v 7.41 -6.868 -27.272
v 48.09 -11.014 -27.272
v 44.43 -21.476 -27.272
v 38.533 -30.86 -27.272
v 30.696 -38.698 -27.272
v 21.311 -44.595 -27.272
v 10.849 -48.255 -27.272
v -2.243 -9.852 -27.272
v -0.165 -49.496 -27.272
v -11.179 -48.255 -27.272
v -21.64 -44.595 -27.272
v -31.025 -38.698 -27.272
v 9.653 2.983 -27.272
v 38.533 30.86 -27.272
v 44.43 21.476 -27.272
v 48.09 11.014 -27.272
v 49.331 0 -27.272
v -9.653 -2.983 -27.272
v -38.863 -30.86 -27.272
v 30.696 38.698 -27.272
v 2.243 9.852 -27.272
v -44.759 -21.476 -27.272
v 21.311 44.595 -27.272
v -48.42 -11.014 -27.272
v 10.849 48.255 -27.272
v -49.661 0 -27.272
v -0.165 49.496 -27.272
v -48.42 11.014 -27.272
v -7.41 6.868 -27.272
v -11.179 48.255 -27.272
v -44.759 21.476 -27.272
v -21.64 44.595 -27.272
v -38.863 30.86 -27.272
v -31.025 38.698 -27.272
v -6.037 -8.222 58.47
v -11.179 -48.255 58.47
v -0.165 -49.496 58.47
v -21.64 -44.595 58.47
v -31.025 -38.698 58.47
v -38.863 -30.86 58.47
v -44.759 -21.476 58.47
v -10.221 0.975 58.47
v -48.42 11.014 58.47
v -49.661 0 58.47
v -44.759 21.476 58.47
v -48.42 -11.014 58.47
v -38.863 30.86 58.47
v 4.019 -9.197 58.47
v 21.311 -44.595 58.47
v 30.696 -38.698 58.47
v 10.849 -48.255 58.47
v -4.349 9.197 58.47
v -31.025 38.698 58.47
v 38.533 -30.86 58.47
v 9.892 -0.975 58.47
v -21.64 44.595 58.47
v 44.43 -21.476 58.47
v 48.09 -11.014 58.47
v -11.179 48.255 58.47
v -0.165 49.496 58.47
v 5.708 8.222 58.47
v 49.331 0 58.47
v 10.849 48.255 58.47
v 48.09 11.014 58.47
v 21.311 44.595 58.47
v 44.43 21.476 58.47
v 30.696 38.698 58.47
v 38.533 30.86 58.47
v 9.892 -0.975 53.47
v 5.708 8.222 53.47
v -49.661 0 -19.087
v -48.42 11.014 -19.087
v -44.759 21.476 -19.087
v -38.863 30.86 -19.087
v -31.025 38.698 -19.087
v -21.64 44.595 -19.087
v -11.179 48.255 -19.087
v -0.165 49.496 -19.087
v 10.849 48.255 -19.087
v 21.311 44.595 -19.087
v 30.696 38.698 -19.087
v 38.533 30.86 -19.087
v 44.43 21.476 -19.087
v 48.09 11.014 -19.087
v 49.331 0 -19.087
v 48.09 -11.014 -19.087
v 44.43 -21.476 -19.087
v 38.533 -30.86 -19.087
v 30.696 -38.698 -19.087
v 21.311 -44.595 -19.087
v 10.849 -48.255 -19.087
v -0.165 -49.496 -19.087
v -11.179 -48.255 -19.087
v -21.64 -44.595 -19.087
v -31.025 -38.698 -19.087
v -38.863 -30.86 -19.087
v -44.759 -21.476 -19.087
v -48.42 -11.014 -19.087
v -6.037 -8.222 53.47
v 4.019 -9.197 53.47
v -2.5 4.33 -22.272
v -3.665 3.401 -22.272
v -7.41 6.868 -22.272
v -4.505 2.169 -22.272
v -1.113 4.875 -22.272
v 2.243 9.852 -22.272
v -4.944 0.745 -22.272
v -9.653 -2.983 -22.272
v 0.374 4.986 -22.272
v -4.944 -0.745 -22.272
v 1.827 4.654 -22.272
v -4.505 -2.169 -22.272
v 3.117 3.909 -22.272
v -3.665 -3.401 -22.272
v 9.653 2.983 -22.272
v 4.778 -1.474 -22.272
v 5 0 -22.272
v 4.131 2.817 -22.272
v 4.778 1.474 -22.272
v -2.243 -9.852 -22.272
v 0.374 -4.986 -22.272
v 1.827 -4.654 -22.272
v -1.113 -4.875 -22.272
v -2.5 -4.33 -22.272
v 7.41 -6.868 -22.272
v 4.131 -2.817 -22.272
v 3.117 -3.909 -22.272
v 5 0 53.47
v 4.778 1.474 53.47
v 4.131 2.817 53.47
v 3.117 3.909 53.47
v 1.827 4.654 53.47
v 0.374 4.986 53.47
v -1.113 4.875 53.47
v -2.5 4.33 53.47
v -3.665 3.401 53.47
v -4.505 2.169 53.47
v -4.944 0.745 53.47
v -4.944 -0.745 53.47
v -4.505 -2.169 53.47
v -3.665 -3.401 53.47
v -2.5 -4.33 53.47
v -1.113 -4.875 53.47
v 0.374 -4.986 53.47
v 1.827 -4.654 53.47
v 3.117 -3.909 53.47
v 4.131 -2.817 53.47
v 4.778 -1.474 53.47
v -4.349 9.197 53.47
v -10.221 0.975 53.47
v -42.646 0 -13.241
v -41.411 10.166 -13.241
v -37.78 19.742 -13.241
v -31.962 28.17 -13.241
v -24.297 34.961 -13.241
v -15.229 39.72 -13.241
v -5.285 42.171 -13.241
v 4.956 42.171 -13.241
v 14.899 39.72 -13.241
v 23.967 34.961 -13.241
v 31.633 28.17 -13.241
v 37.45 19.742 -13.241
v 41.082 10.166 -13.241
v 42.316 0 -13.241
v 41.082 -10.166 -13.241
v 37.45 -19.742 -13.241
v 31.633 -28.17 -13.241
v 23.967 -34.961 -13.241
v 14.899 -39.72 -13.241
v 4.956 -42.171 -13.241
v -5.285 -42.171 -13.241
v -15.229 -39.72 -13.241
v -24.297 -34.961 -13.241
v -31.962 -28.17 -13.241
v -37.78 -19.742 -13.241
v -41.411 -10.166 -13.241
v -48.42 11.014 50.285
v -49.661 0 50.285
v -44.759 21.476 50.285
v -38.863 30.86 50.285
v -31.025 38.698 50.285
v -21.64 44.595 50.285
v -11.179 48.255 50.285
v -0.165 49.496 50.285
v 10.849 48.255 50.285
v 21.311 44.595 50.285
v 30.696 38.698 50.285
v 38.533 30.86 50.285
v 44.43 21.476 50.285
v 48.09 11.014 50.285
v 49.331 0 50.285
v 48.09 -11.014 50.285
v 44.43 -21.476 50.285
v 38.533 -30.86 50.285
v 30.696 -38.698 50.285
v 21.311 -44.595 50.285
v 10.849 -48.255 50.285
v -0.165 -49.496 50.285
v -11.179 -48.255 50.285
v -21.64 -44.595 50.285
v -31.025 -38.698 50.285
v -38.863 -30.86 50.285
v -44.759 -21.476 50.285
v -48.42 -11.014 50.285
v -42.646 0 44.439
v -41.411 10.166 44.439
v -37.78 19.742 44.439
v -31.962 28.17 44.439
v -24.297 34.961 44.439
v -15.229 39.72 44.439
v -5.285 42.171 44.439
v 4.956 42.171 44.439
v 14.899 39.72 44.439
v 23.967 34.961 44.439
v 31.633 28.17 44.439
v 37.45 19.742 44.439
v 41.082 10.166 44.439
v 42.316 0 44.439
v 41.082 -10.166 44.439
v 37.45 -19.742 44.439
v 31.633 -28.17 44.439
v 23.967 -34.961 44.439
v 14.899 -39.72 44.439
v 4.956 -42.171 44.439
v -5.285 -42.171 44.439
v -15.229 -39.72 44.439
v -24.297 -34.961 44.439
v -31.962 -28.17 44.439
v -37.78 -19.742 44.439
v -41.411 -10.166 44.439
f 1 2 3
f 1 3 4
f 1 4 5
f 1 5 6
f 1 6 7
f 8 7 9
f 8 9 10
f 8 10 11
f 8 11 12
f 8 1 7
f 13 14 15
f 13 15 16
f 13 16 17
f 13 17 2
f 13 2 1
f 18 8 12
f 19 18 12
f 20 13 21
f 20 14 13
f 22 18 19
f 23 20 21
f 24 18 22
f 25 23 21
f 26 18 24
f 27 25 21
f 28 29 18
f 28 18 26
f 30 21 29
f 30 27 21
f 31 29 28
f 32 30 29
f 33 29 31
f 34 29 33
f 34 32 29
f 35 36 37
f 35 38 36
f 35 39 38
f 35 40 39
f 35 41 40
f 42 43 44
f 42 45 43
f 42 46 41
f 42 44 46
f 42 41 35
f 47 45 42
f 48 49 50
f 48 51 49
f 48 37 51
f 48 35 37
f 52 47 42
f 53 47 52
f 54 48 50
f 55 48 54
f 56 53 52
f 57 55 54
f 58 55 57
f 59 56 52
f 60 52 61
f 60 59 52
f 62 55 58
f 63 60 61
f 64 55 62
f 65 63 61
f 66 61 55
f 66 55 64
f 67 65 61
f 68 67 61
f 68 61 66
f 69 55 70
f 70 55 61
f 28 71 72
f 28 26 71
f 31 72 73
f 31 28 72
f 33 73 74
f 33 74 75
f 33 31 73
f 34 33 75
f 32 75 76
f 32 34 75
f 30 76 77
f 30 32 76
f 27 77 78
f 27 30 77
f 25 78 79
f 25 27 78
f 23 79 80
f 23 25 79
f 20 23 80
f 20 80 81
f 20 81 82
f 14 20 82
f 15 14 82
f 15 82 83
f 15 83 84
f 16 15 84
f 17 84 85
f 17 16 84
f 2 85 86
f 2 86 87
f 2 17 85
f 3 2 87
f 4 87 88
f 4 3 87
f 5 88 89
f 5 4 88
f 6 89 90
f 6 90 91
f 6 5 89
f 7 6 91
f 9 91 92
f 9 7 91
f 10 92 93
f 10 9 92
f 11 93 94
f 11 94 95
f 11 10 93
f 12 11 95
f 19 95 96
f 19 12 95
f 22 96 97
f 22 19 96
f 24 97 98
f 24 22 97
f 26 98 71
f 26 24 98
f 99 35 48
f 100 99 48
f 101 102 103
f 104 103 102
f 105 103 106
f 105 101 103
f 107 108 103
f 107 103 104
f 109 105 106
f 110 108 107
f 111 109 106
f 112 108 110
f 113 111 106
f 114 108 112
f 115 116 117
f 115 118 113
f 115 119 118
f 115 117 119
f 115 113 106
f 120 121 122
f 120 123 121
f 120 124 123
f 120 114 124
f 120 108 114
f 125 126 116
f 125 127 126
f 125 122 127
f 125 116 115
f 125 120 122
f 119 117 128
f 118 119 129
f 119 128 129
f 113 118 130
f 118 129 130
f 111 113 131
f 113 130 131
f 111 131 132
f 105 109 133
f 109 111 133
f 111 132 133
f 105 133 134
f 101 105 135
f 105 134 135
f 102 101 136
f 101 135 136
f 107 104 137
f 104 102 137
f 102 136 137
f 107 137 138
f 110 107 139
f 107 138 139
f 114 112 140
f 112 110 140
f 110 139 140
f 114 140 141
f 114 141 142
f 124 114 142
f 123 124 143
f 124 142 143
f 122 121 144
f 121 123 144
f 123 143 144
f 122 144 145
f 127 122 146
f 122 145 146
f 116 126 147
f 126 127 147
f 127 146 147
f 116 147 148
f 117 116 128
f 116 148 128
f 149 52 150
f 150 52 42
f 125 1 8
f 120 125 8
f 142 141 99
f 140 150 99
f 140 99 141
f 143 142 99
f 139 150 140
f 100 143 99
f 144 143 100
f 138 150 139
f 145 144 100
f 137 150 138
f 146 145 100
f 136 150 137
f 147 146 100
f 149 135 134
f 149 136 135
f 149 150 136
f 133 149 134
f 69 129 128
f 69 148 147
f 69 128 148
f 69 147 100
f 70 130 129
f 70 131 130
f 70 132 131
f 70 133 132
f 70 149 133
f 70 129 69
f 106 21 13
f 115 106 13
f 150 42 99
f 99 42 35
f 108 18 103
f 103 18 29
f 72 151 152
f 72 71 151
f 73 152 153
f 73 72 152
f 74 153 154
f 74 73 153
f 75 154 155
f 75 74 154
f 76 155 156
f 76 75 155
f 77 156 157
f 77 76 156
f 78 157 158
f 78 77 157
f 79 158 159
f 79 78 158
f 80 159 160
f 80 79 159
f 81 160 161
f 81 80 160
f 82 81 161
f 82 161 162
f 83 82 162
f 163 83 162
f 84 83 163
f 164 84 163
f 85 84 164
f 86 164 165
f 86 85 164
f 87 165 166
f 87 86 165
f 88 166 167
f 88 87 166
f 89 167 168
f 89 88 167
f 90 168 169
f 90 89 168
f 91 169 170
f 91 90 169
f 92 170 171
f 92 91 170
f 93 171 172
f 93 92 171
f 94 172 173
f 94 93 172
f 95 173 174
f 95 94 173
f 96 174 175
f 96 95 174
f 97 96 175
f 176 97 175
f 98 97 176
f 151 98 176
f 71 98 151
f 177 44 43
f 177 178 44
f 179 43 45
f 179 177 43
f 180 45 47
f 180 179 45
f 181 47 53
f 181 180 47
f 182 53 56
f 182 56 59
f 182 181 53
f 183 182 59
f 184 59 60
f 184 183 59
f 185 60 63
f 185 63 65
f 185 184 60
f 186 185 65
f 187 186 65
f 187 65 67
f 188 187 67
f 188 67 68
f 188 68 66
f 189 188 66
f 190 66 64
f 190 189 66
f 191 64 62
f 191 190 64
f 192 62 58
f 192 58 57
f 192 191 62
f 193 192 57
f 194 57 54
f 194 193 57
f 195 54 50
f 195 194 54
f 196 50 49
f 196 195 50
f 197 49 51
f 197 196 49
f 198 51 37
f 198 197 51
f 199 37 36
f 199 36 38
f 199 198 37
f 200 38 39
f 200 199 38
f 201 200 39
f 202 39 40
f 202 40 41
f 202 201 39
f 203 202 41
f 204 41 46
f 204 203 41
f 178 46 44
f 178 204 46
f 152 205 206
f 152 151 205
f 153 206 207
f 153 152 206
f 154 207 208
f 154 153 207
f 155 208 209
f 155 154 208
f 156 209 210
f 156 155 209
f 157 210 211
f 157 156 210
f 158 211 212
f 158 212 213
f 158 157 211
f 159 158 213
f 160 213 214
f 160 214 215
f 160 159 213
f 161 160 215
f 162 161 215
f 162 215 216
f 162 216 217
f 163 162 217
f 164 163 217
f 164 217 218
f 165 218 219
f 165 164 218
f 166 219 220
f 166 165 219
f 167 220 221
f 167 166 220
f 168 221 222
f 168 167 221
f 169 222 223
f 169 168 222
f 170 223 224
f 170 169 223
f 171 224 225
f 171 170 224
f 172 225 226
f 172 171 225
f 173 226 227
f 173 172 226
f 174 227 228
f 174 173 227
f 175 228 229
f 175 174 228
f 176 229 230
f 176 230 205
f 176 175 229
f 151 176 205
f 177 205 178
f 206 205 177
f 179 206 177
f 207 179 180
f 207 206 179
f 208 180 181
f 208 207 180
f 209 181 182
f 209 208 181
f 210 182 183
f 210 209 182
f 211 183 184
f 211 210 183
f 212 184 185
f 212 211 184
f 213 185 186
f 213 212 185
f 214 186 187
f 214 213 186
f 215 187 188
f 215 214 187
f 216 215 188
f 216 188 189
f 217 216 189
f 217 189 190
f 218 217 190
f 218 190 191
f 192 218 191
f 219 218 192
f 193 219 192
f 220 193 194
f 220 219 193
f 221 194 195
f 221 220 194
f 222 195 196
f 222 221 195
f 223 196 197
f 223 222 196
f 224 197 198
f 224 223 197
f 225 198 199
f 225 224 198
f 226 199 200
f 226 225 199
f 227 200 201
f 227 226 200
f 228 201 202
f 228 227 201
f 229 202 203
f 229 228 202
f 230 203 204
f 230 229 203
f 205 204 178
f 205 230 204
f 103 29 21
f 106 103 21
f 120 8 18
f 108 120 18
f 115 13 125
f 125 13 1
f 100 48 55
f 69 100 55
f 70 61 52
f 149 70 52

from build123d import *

# Parameters (mm, degrees)
F2_R     = 5
F3_DEPTH = 500
F4_R     = 5
F5_DEPTH = 5
F6_R     = 5
F7_DEPTH = 5


with BuildPart() as f1:
    # F0 (on Front) → F1 (revolve)
    with BuildSketch(Plane.XZ):
        Polygon((-0.16488, 15.599042), (-0.16488, 58.469787), (-49.661098, 58.469787), (-49.661098, 50.285377), (-42.645885, 44.439362), (-42.645885, 15.599042), (-42.645885, -13.241278), (-49.661098, -19.087292), (-49.661098, -27.271703), (-0.16488, -27.271703), align=None)
    revolve(axis=Axis((-0.16488, 0, 15.599042), (0, 0, -1)))

    # F2 (on Top) → F3 (cut, symmetric)
    with BuildSketch(Plane.XY):
        Circle(F2_R)
    extrude(amount=F3_DEPTH, both=True, mode=Mode.SUBTRACT)

    # F4 (on face) → F5 (cut)
    with BuildSketch(Plane.XY.offset(58.469787)):
        Circle(F4_R)
        Polygon((-4.34874, 9.196665), (-10.221355, 0.975004), (-6.037496, -8.221661), (4.01898, -9.196665), (9.891596, -0.975004), (5.707736, 8.221661), align=None)
        Circle(F4_R, mode=Mode.SUBTRACT)
    extrude(amount=-F5_DEPTH, mode=Mode.SUBTRACT)

    # F6 (on face) → F7 (cut)
    with BuildSketch(Plane(origin=(0, 0, -27.271703), x_dir=(1, 0, 0), z_dir=(0, 0, -1))):
        Polygon((2.242914, -9.851531), (9.653134, -2.983345), (7.410219, 6.868186), (-2.242914, 9.851531), (-9.653134, 2.983345), (-7.410219, -6.868186), align=None)
        Circle(F6_R, mode=Mode.SUBTRACT)
    extrude(amount=-F7_DEPTH, mode=Mode.SUBTRACT)


solid = f1.part
